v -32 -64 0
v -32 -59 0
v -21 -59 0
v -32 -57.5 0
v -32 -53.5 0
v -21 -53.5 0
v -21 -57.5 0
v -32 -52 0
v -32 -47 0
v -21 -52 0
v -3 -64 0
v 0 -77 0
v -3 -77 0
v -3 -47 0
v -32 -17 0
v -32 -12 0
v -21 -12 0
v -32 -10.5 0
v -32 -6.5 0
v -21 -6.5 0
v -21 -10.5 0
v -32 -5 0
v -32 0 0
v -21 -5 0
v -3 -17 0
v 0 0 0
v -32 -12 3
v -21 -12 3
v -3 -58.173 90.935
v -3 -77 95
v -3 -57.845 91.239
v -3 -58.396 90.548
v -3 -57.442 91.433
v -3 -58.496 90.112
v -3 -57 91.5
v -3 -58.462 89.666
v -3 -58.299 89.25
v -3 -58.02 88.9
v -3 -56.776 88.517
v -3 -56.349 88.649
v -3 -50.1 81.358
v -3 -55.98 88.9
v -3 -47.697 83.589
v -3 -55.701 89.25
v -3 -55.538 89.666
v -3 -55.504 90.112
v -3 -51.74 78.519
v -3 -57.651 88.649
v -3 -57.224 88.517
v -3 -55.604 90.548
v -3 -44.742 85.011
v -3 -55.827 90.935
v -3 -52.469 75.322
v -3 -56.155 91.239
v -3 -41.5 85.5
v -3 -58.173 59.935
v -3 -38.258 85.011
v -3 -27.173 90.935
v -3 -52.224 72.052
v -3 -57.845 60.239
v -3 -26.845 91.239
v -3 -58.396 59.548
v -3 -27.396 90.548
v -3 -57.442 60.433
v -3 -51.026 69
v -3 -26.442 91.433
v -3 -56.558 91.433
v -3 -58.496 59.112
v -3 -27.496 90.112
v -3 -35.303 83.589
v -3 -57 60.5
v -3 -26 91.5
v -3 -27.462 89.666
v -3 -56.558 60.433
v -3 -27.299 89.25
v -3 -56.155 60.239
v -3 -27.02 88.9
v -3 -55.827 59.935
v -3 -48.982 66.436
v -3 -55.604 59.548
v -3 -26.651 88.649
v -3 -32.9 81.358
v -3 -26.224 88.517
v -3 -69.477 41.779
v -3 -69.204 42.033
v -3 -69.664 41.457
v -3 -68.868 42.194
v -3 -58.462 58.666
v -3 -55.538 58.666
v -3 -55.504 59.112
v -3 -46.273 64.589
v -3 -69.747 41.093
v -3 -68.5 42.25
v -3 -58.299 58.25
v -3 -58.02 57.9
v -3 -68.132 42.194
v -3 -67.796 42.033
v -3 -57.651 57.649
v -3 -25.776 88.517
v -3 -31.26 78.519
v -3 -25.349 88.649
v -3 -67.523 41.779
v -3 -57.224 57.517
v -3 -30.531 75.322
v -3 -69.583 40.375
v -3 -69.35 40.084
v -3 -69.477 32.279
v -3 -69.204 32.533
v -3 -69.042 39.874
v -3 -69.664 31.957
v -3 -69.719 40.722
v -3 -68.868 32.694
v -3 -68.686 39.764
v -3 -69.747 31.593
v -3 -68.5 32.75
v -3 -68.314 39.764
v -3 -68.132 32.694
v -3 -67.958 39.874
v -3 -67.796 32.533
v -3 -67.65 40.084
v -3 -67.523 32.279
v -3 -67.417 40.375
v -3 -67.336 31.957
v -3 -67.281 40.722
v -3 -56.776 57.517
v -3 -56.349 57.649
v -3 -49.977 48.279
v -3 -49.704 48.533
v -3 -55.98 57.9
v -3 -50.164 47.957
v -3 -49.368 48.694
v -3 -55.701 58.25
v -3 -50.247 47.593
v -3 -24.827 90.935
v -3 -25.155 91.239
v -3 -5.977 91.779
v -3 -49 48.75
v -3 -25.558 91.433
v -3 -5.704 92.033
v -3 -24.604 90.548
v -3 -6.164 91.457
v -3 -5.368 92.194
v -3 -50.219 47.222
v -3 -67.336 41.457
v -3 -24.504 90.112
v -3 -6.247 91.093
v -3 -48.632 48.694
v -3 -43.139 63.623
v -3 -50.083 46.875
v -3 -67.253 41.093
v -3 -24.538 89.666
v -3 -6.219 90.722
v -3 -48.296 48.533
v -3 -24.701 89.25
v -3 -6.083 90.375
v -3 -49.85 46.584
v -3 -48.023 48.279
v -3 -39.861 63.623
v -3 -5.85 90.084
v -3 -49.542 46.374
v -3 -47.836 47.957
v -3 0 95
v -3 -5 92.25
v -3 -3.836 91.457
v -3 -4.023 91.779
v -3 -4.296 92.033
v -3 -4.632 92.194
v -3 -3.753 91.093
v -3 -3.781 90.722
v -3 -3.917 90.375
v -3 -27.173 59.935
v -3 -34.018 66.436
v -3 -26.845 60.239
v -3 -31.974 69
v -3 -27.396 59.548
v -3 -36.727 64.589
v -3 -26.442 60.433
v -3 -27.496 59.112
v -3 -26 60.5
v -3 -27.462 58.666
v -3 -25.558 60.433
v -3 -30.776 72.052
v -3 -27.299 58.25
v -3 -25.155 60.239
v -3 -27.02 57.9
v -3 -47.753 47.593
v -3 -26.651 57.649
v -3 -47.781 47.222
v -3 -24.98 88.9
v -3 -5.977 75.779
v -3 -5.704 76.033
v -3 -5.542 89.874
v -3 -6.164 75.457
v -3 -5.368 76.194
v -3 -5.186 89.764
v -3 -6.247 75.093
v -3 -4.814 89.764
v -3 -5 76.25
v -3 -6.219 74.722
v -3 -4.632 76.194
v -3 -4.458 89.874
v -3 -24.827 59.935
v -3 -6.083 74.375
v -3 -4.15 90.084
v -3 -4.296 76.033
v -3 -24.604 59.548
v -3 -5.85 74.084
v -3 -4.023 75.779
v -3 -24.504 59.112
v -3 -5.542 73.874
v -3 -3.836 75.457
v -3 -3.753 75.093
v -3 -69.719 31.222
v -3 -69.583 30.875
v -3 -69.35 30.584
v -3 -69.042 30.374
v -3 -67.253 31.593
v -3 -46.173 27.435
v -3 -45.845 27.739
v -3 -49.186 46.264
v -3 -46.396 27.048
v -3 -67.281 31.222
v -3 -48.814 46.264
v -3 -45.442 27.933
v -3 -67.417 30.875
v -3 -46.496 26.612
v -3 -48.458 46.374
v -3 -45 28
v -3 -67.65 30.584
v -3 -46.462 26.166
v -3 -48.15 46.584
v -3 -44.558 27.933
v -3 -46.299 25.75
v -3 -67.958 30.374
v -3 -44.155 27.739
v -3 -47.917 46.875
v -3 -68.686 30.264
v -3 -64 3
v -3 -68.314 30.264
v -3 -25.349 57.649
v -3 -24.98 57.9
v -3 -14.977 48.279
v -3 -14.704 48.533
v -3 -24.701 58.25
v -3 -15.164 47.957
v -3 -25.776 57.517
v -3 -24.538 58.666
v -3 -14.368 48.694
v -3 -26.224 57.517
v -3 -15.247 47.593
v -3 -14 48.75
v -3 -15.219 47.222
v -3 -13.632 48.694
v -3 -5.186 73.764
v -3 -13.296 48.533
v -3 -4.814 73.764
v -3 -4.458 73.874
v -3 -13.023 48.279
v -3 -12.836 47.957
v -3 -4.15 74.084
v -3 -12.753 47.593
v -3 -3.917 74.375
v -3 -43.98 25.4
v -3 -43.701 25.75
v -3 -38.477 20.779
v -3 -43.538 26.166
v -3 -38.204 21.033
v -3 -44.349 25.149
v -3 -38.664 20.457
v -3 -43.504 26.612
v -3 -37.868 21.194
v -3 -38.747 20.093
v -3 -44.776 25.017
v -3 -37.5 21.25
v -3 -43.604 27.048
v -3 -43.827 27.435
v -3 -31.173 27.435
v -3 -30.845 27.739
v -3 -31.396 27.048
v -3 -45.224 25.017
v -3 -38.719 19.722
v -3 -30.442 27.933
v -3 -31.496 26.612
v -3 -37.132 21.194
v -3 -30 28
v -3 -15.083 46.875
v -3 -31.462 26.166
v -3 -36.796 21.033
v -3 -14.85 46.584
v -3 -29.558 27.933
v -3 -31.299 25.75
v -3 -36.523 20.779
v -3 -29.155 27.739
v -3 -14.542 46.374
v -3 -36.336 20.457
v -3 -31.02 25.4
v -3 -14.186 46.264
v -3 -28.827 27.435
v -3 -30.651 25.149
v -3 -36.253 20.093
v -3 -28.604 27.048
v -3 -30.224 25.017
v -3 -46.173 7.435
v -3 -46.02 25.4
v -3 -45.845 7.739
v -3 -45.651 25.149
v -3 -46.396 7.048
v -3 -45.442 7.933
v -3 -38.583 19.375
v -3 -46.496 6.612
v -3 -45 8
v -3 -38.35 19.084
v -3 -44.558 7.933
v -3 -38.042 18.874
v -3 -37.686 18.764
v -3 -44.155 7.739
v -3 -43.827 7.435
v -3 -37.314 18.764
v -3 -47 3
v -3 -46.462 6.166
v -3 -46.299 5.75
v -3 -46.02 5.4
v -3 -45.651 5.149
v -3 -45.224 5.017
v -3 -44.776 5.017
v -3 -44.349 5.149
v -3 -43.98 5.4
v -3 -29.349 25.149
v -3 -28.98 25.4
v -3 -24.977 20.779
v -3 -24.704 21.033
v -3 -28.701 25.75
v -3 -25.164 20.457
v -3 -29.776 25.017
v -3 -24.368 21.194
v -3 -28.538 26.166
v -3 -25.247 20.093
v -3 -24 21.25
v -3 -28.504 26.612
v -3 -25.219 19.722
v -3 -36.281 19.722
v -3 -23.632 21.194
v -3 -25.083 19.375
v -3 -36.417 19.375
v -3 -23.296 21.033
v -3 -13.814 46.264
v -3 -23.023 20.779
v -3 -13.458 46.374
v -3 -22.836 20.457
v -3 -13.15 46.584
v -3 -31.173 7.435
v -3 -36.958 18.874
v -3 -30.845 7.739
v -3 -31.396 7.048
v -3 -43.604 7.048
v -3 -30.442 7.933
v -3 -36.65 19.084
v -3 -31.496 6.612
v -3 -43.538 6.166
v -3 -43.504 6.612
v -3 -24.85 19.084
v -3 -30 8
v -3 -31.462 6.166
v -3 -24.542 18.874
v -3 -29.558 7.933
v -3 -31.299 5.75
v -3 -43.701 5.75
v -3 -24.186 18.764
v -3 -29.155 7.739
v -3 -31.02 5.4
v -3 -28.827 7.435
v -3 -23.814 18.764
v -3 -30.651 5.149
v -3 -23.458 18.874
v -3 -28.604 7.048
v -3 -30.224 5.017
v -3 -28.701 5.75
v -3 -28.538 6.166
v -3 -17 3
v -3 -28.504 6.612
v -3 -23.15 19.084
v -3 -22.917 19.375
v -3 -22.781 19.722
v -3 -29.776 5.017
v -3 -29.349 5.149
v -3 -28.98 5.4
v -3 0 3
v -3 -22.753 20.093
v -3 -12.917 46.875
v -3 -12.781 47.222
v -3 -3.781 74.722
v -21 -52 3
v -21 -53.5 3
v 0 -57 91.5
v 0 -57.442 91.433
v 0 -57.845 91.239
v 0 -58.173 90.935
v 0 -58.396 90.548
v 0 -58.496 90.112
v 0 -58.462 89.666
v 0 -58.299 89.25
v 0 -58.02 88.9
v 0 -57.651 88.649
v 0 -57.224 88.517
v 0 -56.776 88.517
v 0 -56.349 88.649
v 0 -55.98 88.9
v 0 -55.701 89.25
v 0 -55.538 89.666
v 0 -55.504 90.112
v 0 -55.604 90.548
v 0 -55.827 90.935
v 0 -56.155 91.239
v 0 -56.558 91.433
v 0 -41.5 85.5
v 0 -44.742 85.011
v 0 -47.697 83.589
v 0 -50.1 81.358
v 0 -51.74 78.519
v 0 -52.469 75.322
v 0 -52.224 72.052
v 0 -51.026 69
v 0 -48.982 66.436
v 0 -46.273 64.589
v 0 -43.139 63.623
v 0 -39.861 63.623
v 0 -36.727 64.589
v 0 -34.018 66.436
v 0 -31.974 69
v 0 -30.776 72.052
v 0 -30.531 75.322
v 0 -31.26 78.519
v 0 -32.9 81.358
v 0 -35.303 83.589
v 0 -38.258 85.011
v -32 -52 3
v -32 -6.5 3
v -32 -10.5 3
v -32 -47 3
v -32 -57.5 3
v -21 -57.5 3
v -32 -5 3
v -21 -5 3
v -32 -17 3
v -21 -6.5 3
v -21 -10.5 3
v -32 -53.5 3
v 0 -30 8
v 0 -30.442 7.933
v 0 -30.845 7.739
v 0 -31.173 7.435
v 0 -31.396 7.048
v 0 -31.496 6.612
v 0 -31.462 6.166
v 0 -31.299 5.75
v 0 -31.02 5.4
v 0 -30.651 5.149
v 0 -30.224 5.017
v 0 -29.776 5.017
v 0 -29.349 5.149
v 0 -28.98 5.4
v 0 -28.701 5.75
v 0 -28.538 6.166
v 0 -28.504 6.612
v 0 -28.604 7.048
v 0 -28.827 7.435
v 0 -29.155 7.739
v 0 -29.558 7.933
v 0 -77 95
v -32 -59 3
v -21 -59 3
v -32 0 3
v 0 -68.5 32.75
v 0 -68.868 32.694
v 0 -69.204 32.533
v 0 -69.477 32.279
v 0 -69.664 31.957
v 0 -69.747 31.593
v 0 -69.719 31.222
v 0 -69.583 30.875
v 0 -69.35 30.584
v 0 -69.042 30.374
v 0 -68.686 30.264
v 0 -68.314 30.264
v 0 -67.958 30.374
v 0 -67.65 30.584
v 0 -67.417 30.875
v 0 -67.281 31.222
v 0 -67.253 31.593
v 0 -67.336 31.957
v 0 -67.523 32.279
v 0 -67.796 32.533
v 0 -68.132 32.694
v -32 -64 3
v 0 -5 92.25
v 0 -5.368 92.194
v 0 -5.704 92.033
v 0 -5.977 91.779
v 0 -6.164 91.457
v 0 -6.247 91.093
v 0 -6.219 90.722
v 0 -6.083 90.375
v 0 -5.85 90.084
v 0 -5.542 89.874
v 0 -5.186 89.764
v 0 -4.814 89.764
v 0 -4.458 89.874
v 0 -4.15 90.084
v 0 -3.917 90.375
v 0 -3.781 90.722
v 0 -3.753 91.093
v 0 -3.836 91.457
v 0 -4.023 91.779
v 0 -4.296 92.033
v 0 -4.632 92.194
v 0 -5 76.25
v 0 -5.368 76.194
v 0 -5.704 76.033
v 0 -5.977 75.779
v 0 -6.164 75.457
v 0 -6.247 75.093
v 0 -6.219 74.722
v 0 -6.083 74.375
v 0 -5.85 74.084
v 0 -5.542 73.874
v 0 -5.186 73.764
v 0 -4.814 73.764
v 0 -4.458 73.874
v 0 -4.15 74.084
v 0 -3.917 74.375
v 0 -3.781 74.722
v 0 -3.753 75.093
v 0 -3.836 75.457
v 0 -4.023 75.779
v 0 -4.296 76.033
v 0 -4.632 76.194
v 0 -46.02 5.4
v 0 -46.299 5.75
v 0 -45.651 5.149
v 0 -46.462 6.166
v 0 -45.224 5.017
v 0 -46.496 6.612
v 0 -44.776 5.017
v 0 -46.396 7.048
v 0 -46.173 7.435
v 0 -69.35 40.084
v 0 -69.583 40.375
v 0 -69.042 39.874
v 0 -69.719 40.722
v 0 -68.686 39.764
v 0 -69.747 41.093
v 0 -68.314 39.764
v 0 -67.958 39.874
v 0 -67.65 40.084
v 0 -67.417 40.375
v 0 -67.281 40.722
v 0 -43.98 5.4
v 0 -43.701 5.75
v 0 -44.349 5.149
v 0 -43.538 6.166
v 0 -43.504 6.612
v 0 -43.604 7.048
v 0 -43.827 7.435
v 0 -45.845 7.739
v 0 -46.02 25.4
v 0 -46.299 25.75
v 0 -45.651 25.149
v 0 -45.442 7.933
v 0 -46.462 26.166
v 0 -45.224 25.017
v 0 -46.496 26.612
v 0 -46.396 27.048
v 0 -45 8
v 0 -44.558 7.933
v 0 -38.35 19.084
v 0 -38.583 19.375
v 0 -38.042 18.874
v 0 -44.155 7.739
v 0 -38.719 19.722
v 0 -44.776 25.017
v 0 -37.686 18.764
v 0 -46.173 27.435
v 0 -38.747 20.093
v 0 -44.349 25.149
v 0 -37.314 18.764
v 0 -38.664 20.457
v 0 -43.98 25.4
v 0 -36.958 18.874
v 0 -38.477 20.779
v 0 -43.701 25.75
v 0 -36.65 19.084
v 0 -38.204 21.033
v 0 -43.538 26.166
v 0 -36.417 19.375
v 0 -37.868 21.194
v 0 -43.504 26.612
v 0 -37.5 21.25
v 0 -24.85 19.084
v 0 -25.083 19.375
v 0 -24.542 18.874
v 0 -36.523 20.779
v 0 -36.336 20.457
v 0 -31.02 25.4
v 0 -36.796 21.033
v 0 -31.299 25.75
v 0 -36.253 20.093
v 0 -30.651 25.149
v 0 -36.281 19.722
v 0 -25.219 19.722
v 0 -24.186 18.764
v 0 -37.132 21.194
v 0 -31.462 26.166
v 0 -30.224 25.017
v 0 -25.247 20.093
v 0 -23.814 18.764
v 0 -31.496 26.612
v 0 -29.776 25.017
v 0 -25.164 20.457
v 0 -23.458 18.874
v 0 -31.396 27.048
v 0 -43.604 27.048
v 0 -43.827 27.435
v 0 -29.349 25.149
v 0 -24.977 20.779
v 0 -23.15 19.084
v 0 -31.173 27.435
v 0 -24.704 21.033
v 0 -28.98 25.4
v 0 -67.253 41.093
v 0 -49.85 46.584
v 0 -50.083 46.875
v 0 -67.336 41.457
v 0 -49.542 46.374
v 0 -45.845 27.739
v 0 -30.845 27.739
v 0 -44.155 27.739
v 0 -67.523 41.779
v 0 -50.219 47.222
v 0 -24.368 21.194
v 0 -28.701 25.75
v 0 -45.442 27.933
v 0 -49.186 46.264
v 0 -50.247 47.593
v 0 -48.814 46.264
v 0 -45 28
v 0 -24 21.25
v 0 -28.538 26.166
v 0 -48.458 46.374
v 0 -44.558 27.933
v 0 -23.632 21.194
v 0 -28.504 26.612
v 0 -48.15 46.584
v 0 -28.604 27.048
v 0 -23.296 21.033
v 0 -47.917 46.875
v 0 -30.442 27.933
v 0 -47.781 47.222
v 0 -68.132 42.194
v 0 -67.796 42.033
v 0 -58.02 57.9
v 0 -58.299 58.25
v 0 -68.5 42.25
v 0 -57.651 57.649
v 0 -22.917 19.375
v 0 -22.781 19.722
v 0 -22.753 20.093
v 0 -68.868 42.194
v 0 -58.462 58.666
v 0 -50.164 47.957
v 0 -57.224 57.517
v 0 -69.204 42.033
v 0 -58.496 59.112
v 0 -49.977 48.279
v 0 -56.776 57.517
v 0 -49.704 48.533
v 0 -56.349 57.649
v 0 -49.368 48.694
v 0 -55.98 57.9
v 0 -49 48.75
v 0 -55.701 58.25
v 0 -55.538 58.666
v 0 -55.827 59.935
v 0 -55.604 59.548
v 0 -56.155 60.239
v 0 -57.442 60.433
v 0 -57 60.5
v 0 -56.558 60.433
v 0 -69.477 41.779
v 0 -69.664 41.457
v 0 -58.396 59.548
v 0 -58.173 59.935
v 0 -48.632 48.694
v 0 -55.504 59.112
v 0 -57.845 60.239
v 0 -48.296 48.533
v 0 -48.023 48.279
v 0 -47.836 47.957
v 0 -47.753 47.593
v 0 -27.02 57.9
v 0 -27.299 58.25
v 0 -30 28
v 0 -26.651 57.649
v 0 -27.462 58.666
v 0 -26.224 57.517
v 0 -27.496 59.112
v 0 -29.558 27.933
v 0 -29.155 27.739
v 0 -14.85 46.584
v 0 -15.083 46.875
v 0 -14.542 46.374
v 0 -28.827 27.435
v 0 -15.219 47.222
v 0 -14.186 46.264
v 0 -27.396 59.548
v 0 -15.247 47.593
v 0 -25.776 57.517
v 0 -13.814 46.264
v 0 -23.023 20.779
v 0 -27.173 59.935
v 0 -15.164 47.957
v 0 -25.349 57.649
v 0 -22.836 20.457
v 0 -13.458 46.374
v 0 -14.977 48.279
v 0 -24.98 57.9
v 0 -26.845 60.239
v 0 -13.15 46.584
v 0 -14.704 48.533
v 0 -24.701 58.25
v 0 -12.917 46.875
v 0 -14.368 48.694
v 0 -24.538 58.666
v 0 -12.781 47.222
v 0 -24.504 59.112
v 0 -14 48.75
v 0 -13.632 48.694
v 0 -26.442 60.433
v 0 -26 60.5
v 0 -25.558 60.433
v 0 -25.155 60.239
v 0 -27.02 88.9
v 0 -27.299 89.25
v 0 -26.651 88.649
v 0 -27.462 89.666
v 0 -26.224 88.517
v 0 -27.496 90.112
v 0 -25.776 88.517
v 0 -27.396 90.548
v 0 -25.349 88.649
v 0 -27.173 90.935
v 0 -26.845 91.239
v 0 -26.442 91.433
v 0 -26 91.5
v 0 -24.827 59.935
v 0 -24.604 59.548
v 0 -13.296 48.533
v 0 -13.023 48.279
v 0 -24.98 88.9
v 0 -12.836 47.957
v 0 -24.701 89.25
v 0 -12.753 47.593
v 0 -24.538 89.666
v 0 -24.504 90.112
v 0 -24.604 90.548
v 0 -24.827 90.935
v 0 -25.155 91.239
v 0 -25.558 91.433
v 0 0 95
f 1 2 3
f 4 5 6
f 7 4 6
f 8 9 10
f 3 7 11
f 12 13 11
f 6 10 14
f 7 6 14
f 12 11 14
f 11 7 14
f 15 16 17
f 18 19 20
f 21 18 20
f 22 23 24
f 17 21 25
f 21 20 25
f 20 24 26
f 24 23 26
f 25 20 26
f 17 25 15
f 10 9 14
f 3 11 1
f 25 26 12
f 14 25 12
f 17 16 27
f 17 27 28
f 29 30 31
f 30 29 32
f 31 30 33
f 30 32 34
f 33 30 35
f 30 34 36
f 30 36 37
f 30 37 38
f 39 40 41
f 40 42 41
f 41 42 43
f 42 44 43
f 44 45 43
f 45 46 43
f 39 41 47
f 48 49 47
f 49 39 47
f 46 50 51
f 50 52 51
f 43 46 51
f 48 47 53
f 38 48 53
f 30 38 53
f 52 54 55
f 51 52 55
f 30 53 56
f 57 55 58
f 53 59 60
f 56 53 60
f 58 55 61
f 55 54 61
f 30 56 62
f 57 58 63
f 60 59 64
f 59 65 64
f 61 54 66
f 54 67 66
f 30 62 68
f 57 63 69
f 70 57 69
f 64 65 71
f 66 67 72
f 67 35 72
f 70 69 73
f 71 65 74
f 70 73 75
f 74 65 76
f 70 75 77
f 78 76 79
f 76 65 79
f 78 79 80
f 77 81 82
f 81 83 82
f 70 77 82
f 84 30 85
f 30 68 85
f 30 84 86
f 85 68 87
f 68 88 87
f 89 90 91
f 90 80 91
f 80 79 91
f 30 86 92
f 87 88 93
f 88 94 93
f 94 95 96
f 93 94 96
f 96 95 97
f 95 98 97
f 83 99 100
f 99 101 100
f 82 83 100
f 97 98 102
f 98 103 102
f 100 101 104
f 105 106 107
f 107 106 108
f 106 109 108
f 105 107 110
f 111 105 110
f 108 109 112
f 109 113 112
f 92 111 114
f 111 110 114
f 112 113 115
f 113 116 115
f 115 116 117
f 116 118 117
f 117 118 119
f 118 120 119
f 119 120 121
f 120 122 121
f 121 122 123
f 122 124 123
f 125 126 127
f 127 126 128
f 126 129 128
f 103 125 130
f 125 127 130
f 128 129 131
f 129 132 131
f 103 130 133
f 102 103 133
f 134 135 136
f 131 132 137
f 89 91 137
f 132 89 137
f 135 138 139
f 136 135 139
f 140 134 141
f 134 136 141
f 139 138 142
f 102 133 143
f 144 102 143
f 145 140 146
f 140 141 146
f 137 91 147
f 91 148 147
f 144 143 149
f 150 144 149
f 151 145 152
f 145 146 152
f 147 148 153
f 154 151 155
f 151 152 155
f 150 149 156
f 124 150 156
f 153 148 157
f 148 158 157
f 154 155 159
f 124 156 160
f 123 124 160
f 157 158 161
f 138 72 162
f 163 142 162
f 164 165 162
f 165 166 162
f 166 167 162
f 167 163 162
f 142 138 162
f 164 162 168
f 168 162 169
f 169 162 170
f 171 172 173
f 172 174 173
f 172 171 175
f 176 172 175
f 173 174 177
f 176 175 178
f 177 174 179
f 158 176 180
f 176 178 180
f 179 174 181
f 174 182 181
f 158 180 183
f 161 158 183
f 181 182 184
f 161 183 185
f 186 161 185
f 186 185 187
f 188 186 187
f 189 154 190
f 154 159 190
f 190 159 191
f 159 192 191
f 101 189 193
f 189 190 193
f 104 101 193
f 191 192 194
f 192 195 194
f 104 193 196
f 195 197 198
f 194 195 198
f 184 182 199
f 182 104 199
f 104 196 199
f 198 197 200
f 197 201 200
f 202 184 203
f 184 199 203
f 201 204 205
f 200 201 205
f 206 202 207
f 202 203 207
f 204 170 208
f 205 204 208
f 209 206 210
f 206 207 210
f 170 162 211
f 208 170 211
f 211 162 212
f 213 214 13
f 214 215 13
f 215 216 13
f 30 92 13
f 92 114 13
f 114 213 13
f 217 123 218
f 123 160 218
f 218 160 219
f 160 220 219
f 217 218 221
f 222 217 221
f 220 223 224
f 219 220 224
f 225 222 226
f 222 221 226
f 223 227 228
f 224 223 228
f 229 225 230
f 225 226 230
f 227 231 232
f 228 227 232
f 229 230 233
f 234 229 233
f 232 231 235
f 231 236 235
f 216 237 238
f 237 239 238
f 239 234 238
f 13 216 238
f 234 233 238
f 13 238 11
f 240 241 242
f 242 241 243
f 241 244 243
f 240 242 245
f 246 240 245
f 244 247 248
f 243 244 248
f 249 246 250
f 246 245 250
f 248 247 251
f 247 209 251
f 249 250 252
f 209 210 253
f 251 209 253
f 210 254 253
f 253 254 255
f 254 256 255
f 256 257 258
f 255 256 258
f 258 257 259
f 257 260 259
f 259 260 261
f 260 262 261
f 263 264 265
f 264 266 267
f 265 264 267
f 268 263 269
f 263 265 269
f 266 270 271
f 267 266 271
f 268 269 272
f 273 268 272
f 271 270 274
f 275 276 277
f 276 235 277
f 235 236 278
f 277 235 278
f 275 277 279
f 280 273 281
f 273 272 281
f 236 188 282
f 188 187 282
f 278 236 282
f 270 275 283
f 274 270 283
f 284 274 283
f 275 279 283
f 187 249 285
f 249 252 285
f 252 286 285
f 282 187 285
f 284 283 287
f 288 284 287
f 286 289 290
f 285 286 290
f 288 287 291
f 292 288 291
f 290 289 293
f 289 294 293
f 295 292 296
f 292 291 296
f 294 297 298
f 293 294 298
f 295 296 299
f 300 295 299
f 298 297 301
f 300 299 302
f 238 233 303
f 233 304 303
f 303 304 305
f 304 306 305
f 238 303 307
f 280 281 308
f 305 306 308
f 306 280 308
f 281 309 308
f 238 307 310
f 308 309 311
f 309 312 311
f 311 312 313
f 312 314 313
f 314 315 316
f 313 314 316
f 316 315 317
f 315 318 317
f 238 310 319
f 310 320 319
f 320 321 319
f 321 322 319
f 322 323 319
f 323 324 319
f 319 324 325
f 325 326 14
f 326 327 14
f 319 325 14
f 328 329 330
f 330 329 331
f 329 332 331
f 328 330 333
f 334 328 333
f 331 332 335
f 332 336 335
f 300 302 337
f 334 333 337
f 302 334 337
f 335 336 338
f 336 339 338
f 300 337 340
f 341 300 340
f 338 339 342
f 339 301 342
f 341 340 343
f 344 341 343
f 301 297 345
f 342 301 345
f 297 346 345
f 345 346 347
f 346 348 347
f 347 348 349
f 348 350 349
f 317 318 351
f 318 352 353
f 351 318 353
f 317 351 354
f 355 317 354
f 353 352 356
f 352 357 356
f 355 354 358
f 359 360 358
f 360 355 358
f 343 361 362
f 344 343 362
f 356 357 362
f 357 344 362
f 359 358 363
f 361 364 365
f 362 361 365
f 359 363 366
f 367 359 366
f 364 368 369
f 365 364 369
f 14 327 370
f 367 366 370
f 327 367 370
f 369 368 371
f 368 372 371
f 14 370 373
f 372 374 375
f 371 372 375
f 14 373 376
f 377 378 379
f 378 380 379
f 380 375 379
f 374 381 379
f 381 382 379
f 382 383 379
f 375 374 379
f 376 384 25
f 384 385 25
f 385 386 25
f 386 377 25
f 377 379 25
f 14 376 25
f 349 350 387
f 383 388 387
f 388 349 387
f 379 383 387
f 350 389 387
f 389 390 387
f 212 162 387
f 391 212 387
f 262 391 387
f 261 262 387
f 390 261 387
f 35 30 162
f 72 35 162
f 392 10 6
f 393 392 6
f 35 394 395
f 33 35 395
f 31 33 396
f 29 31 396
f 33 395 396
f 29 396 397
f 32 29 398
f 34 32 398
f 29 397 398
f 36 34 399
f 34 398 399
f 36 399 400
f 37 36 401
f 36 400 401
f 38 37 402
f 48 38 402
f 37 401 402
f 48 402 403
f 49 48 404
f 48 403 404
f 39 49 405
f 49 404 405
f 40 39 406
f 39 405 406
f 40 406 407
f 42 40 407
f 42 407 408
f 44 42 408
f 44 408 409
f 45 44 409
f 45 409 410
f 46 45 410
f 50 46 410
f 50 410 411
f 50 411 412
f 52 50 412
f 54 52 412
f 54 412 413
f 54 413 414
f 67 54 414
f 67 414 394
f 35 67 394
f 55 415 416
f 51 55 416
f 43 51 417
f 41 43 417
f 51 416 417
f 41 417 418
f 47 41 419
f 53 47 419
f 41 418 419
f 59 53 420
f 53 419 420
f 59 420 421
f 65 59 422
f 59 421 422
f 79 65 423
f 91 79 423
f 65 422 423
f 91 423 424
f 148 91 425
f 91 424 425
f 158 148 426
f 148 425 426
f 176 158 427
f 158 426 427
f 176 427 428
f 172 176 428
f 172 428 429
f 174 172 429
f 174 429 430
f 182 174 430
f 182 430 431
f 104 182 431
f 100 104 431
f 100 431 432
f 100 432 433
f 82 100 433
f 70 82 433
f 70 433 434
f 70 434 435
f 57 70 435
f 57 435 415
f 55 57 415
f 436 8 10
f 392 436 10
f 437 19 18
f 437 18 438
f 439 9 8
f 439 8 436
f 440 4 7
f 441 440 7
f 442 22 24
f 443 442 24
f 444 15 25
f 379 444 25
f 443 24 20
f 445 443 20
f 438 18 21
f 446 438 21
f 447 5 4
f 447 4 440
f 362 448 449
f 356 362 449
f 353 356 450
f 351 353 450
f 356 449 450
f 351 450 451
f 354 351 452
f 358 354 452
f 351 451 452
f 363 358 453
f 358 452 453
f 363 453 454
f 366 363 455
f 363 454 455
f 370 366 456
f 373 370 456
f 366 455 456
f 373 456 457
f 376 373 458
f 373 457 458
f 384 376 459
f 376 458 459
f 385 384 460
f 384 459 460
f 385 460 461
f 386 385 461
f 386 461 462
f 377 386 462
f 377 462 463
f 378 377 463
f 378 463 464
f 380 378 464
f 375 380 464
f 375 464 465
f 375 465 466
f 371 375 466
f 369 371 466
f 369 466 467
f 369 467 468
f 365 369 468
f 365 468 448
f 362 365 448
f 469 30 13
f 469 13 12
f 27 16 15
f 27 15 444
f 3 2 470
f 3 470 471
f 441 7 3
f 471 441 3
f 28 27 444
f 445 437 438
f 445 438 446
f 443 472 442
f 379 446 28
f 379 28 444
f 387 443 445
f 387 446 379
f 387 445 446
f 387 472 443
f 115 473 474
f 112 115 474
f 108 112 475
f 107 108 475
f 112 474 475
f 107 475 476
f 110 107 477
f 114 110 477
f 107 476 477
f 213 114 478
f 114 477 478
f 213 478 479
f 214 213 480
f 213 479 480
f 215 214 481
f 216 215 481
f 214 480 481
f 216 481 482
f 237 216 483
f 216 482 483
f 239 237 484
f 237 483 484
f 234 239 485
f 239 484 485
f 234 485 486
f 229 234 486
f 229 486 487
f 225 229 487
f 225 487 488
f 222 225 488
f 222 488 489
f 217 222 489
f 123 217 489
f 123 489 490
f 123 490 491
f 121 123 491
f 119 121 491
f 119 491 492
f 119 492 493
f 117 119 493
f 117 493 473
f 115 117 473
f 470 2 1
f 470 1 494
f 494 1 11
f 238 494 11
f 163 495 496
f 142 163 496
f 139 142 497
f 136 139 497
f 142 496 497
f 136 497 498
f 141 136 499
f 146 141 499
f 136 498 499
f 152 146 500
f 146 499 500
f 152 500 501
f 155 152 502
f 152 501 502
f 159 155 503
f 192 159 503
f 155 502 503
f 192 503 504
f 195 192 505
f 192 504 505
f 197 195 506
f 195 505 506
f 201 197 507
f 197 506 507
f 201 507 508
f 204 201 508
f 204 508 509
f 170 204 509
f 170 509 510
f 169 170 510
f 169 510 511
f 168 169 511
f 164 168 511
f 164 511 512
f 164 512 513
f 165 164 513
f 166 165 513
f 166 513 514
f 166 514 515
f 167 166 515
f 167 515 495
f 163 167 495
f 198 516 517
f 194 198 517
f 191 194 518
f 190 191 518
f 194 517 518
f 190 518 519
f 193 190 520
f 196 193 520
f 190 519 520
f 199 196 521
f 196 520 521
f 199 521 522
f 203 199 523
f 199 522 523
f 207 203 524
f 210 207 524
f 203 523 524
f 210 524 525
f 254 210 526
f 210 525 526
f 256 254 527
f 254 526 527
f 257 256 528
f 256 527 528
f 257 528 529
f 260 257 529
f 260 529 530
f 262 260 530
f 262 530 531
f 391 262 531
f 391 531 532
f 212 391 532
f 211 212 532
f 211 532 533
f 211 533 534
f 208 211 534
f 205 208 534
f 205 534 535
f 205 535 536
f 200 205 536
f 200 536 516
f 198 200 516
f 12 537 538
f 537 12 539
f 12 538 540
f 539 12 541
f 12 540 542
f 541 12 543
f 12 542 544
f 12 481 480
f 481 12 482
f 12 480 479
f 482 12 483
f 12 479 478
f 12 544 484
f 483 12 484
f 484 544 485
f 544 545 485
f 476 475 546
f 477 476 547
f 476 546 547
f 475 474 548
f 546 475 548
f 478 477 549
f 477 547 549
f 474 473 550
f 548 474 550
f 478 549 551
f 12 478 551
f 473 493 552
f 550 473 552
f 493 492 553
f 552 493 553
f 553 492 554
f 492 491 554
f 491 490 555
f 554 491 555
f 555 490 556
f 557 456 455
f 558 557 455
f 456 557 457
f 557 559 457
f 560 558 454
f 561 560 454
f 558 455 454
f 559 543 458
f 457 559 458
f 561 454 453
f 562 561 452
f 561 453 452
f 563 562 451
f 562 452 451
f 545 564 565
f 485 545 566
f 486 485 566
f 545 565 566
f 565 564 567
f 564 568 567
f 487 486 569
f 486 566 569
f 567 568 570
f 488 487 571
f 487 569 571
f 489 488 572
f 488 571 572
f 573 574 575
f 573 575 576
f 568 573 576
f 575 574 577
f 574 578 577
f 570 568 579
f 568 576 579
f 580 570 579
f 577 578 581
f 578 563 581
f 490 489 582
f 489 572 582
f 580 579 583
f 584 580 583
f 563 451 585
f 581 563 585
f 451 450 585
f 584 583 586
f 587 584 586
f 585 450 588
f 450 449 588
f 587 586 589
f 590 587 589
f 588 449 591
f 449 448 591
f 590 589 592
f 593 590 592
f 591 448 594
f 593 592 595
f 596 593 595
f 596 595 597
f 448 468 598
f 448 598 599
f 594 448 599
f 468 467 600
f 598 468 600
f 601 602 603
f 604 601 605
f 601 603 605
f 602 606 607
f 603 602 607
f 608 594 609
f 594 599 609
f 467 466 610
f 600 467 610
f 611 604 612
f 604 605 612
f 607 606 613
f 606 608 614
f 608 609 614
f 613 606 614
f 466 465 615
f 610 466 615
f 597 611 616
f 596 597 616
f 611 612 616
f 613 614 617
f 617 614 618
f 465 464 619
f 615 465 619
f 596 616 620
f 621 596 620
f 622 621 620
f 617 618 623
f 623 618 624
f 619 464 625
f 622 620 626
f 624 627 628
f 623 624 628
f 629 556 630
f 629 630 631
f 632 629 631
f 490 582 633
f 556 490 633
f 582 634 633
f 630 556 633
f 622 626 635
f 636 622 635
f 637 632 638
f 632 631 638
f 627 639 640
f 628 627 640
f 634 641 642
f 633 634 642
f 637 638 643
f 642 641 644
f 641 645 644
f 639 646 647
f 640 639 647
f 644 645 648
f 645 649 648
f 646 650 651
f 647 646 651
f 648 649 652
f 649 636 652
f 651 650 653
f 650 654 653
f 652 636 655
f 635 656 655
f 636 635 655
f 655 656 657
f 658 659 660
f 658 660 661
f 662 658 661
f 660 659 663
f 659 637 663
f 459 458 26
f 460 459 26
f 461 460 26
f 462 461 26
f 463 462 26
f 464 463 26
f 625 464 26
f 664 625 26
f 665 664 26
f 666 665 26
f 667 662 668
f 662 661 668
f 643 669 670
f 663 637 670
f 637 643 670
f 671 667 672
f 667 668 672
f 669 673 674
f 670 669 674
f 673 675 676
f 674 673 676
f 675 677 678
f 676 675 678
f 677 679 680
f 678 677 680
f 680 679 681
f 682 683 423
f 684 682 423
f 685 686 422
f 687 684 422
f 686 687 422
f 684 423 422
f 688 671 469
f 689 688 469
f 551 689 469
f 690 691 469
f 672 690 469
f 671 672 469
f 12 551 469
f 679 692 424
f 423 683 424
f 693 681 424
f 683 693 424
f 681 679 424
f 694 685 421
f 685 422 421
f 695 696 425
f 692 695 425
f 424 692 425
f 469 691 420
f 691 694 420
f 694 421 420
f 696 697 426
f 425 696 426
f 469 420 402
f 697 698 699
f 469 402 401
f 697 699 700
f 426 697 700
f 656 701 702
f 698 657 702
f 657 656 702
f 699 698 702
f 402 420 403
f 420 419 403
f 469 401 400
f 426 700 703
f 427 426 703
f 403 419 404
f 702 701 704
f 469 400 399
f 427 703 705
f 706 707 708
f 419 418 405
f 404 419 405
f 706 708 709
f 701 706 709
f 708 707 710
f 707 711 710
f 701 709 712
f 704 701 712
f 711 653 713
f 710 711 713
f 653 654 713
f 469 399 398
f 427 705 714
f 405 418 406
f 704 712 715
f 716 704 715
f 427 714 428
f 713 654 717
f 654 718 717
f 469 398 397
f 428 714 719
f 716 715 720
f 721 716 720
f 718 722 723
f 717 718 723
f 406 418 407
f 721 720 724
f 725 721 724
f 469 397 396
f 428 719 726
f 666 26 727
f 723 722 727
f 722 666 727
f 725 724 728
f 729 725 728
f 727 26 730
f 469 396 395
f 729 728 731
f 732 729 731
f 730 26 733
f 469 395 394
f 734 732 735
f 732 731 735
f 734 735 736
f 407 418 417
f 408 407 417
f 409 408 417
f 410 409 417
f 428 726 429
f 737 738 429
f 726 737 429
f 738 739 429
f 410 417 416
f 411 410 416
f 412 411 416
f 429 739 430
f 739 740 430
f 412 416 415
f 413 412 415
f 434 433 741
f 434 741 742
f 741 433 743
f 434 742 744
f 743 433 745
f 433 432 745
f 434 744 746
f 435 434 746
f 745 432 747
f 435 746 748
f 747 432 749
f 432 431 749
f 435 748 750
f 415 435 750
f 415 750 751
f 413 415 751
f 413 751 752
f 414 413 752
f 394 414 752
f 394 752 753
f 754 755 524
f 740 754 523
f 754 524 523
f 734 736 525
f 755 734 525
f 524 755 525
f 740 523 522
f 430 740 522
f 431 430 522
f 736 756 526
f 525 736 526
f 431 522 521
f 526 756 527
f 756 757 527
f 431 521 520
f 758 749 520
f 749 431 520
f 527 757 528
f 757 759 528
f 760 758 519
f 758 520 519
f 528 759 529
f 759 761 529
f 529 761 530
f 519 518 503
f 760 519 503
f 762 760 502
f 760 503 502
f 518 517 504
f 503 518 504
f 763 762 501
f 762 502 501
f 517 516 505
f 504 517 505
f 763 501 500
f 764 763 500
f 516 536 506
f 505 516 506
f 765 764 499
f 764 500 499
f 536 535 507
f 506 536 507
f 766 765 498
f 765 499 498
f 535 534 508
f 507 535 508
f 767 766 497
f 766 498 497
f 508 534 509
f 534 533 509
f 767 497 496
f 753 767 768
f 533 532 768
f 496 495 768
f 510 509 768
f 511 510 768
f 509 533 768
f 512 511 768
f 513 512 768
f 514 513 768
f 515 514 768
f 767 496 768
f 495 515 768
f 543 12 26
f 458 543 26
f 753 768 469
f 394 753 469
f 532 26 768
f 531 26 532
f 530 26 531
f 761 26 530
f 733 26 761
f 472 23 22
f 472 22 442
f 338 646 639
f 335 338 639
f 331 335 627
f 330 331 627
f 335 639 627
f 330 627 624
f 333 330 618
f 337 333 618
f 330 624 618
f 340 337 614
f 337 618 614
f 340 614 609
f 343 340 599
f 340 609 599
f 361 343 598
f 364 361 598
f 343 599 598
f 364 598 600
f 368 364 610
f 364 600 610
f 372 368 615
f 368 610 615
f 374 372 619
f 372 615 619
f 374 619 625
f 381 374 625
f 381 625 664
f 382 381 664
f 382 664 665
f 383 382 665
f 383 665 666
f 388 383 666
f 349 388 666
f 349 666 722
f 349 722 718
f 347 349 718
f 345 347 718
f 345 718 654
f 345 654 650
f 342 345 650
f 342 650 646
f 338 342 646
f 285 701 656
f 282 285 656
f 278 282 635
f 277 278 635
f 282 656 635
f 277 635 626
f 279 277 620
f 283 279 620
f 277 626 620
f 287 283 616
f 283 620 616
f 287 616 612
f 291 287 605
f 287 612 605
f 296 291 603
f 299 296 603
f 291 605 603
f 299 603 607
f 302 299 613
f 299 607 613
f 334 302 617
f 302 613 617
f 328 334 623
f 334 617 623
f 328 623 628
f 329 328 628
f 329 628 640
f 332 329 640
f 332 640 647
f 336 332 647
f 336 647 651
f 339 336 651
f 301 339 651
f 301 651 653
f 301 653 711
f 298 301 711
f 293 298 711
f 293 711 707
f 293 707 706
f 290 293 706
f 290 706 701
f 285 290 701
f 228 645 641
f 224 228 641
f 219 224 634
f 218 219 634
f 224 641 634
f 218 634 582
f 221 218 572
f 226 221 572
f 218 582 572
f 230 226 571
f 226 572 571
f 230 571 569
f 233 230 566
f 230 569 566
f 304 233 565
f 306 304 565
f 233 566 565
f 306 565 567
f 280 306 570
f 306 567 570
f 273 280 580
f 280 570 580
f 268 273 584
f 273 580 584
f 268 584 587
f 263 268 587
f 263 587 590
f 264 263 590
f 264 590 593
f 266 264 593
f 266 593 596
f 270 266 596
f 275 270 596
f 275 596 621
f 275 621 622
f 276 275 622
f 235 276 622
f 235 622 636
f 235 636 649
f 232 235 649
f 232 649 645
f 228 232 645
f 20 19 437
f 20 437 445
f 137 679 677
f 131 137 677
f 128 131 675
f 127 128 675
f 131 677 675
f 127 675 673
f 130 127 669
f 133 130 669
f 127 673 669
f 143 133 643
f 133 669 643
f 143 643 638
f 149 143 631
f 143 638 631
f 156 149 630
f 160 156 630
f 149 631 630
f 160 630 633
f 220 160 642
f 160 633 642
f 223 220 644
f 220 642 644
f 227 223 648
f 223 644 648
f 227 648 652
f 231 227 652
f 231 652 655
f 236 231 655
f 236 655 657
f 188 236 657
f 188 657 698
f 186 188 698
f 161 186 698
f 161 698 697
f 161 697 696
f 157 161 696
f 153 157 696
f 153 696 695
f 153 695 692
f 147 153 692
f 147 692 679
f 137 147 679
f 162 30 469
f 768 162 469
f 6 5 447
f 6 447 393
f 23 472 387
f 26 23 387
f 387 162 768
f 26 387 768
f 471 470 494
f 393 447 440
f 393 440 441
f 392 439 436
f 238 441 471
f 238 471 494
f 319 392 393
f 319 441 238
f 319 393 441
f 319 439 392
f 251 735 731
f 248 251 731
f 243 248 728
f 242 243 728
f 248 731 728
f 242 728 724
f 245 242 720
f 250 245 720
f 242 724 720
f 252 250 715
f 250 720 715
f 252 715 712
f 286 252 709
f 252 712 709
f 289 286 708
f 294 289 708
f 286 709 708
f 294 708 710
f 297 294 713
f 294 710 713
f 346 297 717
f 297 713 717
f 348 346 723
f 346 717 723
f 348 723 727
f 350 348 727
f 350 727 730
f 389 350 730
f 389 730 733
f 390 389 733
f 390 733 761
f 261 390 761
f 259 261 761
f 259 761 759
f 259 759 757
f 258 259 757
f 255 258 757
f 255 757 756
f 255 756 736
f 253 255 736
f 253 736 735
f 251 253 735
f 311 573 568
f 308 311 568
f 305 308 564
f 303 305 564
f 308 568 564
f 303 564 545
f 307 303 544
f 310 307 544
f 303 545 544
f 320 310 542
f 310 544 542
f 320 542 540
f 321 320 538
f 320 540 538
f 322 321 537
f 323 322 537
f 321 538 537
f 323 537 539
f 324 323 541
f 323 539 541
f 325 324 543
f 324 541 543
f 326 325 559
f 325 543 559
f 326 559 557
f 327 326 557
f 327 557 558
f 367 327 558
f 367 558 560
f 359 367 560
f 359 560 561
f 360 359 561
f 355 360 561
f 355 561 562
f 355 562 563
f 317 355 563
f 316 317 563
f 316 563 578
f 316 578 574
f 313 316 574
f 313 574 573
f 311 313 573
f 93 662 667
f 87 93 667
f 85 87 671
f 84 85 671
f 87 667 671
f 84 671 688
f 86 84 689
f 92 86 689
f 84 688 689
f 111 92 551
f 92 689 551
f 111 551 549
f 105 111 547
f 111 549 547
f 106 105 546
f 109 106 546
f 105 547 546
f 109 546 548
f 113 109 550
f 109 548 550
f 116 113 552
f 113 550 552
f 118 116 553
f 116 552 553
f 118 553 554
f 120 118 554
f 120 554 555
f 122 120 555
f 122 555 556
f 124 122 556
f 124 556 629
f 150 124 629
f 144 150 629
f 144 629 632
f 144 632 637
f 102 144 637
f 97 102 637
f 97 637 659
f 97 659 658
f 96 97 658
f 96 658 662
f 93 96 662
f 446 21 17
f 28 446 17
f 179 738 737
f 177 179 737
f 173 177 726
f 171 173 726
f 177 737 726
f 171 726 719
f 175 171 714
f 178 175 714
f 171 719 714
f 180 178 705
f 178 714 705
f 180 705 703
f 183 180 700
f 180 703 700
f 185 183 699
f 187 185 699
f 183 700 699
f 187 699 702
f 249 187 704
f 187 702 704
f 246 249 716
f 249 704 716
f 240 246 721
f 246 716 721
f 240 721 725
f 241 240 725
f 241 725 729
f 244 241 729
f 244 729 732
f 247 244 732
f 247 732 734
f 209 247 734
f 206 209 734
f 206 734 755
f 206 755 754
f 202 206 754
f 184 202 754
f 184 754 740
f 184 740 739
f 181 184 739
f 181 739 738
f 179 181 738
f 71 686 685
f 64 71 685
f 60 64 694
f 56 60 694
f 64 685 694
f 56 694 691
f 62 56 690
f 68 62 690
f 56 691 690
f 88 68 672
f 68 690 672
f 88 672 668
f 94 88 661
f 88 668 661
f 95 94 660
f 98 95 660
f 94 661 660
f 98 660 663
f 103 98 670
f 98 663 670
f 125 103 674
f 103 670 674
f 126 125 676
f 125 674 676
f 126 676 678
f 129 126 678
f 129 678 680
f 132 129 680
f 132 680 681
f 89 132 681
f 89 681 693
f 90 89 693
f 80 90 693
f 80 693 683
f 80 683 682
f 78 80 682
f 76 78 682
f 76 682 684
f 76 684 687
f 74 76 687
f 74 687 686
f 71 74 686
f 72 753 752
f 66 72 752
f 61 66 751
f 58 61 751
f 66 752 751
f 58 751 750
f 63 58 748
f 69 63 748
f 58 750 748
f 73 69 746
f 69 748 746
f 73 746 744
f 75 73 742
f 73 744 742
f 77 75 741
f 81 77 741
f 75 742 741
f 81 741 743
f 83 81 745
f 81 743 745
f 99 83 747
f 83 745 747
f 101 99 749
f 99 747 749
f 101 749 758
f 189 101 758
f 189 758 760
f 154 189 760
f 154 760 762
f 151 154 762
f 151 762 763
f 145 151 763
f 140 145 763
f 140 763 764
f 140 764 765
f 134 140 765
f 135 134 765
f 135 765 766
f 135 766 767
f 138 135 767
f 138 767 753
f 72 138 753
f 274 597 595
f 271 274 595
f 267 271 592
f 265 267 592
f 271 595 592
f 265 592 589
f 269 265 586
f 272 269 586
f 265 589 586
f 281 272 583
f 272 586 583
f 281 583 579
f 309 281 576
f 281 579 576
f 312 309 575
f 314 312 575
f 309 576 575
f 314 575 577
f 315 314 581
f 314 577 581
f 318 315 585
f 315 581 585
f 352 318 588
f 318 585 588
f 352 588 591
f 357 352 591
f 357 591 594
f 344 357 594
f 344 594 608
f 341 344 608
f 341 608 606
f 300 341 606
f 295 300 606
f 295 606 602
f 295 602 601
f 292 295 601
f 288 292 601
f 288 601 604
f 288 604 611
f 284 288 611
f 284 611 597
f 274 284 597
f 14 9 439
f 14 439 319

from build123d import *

# Parameters (mm, degrees)
SKETCH_W        = 32
SKETCH_H        = 95
PAD_DEPTH       = 77
SKETCH001_W     = 29
SKETCH001_H     = 92
POCKET_DEPTH    = 77.001
SKETCH002_W     = 11
SKETCH002_H     = 1.5
SKETCH002_W_2   = 29
SKETCH002_H_2   = 30
SKETCH002_H_3   = 13
POCKET001_DEPTH = 95.001
SKETCH003_R     = 1.25
SKETCH003_R_2   = 1.5
SKETCH003_R_3   = 11
POCKET002_DEPTH = 32.001
SKETCH004_R     = 1.5
POCKET003_DEPTH = 32.001


with BuildPart() as part:
    # Sketch → Pad (new body)
    with BuildSketch(Plane.XZ):
        with Locations((-16, 47.5)):
            Rectangle(SKETCH_W, SKETCH_H)
    extrude(amount=PAD_DEPTH)

    # Sketch001 (on Face5 of Pad) → Pocket (cut, through all)
    with BuildSketch(Plane(origin=(0, 0, 0), x_dir=(1, 0, 0), z_dir=(0, 1, 0))):
        with Locations((-17.5, -49)):
            Rectangle(SKETCH001_W, SKETCH001_H)
    extrude(amount=-POCKET_DEPTH, mode=Mode.SUBTRACT)

    # Sketch002 (on Face1 of Pocket) → Pocket001 (cut, through all)
    with BuildSketch(Plane(origin=(0, 0, 0), x_dir=(1, 0, 0), z_dir=(0, 0, -1))):
        with Locations((-26.5, 11.25)):
            Rectangle(SKETCH002_W, SKETCH002_H)
        with Locations((-26.5, 5.75)):
            Rectangle(SKETCH002_W, SKETCH002_H)
        with Locations((-26.5, 58.25)):
            Rectangle(SKETCH002_W, SKETCH002_H)
        with Locations((-26.5, 52.75)):
            Rectangle(SKETCH002_W, SKETCH002_H)
        with Locations((-17.5, 32)):
            Rectangle(SKETCH002_W_2, SKETCH002_H_2)
        with Locations((-17.5, 70.5)):
            Rectangle(SKETCH002_W_2, SKETCH002_H_3)
    extrude(amount=-POCKET001_DEPTH, mode=Mode.SUBTRACT)

    # Sketch003 (on Face27 of Pocket001) → Pocket002 (cut, through all)
    with BuildSketch(Plane(origin=(0, 0, 0), x_dir=(0, 0, 1), z_dir=(1, 0, 0))):
        with Locations((20, 37.5)):
            Circle(SKETCH003_R)
        with Locations((20, 24)):
            Circle(SKETCH003_R)
        with Locations((47.5, 49)):
            Circle(SKETCH003_R)
        with Locations((47.5, 14)):
            Circle(SKETCH003_R)
        with Locations((59, 57)):
            Circle(SKETCH003_R_2)
        with Locations((90, 57)):
            Circle(SKETCH003_R_2)
        with Locations((90, 26)):
            Circle(SKETCH003_R_2)
        with Locations((59, 26)):
            Circle(SKETCH003_R_2)
        with Locations((74.5, 41.5)):
            Circle(SKETCH003_R_3)
        with Locations((75, 5)):
            Circle(SKETCH003_R)
        with Locations((91, 5)):
            Circle(SKETCH003_R)
        with Locations((31.5, 68.5)):
            Circle(SKETCH003_R)
        with Locations((41, 68.5)):
            Circle(SKETCH003_R)
    extrude(amount=-POCKET002_DEPTH, mode=Mode.SUBTRACT)

    # Sketch004 (on Face27 of Pocket002) → Pocket003 (cut, through all)
    with BuildSketch(Plane(origin=(0, 0, 0), x_dir=(0, 0, 1), z_dir=(1, 0, 0))):
        with Locations((6.5, 30)):
            Circle(SKETCH004_R)
        with Locations((26.5, 30)):
            Circle(SKETCH004_R)
        with Locations((26.5, 45)):
            Circle(SKETCH004_R)
        with Locations((6.5, 45)):
            Circle(SKETCH004_R)
    extrude(amount=-POCKET003_DEPTH, mode=Mode.SUBTRACT)


solid = part.part
